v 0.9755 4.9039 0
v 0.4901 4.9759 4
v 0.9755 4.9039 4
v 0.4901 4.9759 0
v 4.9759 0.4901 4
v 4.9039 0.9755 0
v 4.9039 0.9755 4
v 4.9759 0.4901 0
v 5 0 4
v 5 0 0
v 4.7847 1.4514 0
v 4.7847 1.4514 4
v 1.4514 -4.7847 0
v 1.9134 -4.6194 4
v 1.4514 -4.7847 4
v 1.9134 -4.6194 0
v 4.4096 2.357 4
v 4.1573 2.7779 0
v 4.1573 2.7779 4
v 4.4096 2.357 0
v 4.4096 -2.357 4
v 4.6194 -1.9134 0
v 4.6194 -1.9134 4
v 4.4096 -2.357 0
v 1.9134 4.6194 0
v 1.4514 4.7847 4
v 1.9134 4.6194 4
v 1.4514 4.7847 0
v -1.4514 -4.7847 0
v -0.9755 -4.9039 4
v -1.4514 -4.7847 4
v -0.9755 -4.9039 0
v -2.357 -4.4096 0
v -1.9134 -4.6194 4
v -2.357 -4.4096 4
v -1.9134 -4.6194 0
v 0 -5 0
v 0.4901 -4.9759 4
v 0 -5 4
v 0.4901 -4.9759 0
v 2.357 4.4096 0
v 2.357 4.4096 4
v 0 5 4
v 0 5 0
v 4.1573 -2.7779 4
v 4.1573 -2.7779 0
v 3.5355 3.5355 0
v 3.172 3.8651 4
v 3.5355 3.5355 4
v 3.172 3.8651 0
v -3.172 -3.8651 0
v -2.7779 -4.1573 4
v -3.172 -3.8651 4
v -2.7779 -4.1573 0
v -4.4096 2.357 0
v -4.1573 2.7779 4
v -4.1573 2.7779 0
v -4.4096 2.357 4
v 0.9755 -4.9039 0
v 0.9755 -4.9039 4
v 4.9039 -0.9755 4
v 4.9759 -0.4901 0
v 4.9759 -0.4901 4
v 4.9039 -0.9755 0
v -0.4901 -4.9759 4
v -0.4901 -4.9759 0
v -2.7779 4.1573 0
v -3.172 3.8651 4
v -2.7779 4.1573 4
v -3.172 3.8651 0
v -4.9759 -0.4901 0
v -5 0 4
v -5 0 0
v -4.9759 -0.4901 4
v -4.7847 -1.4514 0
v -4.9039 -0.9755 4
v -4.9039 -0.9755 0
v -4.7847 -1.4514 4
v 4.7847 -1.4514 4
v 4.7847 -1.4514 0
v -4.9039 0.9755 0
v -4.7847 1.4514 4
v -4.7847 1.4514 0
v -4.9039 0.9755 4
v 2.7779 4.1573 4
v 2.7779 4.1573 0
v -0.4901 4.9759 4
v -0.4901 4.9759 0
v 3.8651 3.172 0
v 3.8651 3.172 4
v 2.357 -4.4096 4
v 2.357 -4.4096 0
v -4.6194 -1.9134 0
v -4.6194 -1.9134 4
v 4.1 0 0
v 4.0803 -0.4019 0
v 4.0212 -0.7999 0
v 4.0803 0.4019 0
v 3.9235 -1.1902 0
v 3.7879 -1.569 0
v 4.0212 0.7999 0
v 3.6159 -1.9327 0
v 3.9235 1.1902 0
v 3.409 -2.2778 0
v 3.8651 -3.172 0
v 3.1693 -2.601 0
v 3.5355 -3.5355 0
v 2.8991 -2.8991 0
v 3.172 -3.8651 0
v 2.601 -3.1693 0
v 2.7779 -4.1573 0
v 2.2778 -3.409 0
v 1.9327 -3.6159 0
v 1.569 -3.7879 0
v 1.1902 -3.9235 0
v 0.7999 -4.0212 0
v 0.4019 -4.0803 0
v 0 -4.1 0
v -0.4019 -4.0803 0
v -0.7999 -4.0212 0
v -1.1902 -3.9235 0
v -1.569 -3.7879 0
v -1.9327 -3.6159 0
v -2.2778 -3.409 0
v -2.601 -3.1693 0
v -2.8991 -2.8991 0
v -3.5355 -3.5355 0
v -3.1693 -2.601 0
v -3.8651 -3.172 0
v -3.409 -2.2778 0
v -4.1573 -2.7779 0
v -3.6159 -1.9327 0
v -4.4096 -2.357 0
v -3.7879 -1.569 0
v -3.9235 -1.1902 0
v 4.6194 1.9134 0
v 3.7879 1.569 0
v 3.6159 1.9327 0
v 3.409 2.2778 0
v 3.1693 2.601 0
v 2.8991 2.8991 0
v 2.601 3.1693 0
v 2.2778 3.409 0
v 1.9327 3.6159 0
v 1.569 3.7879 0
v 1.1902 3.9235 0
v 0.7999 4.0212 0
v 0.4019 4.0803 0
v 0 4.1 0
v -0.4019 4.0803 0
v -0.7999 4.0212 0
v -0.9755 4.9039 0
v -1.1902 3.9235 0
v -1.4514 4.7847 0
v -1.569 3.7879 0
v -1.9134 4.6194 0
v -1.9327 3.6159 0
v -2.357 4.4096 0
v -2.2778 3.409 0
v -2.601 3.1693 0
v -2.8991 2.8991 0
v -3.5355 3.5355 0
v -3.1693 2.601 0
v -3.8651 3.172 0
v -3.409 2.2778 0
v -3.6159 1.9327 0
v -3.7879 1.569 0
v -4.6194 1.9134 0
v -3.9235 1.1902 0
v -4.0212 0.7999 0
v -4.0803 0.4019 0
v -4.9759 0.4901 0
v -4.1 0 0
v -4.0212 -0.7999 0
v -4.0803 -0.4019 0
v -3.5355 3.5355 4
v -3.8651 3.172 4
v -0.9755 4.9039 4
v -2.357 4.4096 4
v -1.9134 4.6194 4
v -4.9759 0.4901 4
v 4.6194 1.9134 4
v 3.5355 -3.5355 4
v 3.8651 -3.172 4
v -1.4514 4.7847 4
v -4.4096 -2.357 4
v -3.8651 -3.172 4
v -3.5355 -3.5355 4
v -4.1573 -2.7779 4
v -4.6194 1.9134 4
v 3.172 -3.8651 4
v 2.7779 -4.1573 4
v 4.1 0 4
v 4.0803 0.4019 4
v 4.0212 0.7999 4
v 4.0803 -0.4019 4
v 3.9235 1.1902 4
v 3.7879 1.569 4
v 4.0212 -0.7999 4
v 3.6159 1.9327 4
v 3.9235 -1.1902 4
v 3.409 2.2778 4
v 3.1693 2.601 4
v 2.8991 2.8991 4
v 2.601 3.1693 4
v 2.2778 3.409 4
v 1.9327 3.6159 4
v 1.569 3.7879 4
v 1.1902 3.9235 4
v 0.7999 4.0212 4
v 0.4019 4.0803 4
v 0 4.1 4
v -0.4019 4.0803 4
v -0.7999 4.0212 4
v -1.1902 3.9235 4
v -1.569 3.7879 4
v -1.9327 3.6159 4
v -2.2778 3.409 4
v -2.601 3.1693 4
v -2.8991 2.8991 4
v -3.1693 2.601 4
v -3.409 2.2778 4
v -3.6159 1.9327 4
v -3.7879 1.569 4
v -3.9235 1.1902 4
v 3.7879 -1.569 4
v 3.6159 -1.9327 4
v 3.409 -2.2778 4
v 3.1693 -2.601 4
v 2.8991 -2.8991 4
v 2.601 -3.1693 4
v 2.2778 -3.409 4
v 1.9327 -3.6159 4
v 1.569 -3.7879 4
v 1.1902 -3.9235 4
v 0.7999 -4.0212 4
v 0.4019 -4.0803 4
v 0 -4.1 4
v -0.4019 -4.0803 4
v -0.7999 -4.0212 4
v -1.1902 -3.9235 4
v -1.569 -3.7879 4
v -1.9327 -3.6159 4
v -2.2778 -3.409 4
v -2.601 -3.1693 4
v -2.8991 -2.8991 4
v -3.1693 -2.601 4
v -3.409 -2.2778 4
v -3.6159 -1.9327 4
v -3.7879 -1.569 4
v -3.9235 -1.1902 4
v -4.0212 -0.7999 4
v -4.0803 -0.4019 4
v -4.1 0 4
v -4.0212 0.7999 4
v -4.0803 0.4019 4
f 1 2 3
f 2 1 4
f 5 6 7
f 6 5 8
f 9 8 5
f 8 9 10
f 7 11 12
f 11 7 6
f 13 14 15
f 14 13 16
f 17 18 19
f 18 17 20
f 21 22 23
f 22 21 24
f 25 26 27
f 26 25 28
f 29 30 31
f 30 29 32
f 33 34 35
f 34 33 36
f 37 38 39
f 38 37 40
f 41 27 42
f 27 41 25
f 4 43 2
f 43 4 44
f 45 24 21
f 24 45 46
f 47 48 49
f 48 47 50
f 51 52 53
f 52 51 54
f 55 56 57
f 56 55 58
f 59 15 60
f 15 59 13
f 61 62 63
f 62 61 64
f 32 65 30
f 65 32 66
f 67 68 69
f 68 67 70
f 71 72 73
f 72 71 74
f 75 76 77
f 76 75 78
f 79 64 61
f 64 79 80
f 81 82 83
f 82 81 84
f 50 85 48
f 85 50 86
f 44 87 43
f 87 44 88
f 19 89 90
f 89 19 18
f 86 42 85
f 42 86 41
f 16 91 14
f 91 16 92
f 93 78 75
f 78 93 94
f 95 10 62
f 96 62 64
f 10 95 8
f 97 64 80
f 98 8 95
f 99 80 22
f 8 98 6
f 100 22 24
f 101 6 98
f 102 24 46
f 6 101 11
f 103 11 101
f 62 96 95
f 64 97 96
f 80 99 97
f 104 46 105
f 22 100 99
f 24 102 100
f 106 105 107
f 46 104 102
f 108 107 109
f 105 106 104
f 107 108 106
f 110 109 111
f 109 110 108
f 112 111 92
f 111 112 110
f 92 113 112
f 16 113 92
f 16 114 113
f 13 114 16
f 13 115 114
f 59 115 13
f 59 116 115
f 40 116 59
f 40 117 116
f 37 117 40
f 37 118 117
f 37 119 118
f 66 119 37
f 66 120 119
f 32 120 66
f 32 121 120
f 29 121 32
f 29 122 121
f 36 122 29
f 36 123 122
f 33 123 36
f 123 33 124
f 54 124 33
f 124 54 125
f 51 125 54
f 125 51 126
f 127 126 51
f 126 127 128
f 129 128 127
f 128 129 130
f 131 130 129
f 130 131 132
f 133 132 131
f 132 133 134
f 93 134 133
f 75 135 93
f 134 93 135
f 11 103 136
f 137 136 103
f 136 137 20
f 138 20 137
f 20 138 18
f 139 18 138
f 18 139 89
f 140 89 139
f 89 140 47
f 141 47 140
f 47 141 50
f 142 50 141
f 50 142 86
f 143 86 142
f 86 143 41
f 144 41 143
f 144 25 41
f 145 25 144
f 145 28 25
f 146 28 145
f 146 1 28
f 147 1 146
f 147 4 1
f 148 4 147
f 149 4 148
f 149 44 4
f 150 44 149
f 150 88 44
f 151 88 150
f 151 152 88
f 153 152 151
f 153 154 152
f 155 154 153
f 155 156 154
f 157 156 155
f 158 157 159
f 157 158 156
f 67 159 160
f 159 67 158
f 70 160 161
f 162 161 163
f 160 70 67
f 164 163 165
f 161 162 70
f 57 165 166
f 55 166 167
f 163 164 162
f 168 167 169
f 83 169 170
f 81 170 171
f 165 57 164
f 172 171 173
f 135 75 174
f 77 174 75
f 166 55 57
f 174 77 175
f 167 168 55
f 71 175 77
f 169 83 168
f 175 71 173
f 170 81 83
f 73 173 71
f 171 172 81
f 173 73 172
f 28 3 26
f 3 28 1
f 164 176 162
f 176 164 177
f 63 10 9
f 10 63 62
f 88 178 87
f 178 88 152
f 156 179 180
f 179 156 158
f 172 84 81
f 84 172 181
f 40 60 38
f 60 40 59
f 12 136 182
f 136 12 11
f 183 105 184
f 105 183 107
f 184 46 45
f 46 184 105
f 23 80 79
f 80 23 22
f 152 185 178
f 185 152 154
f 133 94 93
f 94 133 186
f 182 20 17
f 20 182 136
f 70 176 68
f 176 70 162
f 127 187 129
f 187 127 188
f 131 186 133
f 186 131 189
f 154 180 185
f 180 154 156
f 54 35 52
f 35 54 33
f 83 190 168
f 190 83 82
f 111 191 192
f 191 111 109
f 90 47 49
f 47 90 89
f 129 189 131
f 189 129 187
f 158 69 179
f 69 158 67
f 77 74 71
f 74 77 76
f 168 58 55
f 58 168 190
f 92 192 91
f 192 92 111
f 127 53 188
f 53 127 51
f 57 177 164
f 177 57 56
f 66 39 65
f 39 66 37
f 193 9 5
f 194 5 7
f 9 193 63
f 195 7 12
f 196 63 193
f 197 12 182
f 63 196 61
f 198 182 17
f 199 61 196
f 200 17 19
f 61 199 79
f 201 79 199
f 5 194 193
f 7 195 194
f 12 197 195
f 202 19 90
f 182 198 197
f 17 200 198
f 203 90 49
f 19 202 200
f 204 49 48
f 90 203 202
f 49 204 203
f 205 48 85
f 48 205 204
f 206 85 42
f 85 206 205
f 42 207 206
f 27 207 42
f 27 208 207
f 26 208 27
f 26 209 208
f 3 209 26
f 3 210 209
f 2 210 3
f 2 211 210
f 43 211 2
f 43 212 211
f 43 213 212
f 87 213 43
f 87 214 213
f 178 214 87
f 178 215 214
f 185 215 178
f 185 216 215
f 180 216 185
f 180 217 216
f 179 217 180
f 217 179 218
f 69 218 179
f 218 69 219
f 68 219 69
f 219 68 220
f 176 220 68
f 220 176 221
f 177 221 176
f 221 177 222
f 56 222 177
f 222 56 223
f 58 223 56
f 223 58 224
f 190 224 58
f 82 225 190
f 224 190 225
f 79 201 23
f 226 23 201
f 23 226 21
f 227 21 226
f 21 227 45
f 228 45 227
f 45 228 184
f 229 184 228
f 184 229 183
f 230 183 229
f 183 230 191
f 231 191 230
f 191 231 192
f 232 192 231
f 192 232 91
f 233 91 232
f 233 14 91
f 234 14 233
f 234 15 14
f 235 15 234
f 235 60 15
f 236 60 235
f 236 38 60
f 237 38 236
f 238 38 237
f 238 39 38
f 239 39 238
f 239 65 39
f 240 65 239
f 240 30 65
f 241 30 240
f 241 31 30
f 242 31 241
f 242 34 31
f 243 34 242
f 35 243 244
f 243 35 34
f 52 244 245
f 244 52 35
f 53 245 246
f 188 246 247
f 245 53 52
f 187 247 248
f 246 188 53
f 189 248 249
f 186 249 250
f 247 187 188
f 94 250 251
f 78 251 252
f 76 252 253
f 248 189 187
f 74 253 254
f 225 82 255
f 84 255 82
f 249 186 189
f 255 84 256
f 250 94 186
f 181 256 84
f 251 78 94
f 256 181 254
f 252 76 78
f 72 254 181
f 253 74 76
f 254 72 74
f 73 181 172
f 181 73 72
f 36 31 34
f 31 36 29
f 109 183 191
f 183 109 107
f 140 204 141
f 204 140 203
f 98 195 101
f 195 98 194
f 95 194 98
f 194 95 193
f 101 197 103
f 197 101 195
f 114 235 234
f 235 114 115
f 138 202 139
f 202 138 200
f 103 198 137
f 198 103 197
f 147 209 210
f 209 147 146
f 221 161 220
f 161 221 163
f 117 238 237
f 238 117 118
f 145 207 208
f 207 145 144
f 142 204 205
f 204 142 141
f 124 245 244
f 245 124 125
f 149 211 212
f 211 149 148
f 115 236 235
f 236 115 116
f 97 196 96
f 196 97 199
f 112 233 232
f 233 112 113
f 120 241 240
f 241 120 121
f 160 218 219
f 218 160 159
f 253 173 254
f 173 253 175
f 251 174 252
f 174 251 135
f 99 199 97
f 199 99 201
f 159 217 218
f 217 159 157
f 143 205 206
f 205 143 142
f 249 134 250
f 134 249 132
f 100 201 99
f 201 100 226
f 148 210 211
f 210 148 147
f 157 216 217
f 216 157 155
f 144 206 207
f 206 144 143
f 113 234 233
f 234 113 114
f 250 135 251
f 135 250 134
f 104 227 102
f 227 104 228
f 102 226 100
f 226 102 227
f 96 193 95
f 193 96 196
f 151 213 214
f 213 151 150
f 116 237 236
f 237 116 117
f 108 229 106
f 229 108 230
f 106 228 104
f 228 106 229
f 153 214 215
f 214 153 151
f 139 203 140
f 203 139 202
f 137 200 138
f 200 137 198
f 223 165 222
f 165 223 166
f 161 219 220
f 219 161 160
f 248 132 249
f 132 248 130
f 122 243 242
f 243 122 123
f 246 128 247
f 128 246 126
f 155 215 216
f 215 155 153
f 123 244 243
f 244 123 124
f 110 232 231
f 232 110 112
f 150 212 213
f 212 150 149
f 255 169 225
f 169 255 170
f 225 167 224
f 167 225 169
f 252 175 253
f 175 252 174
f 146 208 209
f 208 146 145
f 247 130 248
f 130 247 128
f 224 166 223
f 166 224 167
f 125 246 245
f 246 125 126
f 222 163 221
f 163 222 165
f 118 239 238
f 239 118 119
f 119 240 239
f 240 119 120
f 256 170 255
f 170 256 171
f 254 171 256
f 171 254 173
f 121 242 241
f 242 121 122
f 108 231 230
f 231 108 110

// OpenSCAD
// file: lib/shaft_lock.scad
module shaftlock(thickness, width, height, tol1, tol2) {
    cube(
        [
            width+tol1,
            height+tol2,
            thickness
        ],    
        center=true
     );
     
     rotate([0, 0, -90]) {
        cube(
            [
                width+tol1, 
                height+tol2, 
                thickness
            ],    
            center=true
         );
     }
}
// main file
use <./lib/shaft_lock.scad>

$fn=64;

length=4;

type="free";

innerDiameter=8;
outerDiameter=10;

lockWidth=4;
lockHeight=7;
shaftTolerance=0.2;

difference() {
    cylinder(h=length, r=outerDiameter/2);
    
    if (type == "free") {
        translate([0,0,-0.5])
            cylinder(h=length+1, d=innerDiameter+shaftTolerance);
    } else if (type == "lock") {
        translate([0,0,length/2]) {
            shaftlock(length, lockWidth, lockHeight, shaftTolerance, shaftTolerance);
        }
    }
}
